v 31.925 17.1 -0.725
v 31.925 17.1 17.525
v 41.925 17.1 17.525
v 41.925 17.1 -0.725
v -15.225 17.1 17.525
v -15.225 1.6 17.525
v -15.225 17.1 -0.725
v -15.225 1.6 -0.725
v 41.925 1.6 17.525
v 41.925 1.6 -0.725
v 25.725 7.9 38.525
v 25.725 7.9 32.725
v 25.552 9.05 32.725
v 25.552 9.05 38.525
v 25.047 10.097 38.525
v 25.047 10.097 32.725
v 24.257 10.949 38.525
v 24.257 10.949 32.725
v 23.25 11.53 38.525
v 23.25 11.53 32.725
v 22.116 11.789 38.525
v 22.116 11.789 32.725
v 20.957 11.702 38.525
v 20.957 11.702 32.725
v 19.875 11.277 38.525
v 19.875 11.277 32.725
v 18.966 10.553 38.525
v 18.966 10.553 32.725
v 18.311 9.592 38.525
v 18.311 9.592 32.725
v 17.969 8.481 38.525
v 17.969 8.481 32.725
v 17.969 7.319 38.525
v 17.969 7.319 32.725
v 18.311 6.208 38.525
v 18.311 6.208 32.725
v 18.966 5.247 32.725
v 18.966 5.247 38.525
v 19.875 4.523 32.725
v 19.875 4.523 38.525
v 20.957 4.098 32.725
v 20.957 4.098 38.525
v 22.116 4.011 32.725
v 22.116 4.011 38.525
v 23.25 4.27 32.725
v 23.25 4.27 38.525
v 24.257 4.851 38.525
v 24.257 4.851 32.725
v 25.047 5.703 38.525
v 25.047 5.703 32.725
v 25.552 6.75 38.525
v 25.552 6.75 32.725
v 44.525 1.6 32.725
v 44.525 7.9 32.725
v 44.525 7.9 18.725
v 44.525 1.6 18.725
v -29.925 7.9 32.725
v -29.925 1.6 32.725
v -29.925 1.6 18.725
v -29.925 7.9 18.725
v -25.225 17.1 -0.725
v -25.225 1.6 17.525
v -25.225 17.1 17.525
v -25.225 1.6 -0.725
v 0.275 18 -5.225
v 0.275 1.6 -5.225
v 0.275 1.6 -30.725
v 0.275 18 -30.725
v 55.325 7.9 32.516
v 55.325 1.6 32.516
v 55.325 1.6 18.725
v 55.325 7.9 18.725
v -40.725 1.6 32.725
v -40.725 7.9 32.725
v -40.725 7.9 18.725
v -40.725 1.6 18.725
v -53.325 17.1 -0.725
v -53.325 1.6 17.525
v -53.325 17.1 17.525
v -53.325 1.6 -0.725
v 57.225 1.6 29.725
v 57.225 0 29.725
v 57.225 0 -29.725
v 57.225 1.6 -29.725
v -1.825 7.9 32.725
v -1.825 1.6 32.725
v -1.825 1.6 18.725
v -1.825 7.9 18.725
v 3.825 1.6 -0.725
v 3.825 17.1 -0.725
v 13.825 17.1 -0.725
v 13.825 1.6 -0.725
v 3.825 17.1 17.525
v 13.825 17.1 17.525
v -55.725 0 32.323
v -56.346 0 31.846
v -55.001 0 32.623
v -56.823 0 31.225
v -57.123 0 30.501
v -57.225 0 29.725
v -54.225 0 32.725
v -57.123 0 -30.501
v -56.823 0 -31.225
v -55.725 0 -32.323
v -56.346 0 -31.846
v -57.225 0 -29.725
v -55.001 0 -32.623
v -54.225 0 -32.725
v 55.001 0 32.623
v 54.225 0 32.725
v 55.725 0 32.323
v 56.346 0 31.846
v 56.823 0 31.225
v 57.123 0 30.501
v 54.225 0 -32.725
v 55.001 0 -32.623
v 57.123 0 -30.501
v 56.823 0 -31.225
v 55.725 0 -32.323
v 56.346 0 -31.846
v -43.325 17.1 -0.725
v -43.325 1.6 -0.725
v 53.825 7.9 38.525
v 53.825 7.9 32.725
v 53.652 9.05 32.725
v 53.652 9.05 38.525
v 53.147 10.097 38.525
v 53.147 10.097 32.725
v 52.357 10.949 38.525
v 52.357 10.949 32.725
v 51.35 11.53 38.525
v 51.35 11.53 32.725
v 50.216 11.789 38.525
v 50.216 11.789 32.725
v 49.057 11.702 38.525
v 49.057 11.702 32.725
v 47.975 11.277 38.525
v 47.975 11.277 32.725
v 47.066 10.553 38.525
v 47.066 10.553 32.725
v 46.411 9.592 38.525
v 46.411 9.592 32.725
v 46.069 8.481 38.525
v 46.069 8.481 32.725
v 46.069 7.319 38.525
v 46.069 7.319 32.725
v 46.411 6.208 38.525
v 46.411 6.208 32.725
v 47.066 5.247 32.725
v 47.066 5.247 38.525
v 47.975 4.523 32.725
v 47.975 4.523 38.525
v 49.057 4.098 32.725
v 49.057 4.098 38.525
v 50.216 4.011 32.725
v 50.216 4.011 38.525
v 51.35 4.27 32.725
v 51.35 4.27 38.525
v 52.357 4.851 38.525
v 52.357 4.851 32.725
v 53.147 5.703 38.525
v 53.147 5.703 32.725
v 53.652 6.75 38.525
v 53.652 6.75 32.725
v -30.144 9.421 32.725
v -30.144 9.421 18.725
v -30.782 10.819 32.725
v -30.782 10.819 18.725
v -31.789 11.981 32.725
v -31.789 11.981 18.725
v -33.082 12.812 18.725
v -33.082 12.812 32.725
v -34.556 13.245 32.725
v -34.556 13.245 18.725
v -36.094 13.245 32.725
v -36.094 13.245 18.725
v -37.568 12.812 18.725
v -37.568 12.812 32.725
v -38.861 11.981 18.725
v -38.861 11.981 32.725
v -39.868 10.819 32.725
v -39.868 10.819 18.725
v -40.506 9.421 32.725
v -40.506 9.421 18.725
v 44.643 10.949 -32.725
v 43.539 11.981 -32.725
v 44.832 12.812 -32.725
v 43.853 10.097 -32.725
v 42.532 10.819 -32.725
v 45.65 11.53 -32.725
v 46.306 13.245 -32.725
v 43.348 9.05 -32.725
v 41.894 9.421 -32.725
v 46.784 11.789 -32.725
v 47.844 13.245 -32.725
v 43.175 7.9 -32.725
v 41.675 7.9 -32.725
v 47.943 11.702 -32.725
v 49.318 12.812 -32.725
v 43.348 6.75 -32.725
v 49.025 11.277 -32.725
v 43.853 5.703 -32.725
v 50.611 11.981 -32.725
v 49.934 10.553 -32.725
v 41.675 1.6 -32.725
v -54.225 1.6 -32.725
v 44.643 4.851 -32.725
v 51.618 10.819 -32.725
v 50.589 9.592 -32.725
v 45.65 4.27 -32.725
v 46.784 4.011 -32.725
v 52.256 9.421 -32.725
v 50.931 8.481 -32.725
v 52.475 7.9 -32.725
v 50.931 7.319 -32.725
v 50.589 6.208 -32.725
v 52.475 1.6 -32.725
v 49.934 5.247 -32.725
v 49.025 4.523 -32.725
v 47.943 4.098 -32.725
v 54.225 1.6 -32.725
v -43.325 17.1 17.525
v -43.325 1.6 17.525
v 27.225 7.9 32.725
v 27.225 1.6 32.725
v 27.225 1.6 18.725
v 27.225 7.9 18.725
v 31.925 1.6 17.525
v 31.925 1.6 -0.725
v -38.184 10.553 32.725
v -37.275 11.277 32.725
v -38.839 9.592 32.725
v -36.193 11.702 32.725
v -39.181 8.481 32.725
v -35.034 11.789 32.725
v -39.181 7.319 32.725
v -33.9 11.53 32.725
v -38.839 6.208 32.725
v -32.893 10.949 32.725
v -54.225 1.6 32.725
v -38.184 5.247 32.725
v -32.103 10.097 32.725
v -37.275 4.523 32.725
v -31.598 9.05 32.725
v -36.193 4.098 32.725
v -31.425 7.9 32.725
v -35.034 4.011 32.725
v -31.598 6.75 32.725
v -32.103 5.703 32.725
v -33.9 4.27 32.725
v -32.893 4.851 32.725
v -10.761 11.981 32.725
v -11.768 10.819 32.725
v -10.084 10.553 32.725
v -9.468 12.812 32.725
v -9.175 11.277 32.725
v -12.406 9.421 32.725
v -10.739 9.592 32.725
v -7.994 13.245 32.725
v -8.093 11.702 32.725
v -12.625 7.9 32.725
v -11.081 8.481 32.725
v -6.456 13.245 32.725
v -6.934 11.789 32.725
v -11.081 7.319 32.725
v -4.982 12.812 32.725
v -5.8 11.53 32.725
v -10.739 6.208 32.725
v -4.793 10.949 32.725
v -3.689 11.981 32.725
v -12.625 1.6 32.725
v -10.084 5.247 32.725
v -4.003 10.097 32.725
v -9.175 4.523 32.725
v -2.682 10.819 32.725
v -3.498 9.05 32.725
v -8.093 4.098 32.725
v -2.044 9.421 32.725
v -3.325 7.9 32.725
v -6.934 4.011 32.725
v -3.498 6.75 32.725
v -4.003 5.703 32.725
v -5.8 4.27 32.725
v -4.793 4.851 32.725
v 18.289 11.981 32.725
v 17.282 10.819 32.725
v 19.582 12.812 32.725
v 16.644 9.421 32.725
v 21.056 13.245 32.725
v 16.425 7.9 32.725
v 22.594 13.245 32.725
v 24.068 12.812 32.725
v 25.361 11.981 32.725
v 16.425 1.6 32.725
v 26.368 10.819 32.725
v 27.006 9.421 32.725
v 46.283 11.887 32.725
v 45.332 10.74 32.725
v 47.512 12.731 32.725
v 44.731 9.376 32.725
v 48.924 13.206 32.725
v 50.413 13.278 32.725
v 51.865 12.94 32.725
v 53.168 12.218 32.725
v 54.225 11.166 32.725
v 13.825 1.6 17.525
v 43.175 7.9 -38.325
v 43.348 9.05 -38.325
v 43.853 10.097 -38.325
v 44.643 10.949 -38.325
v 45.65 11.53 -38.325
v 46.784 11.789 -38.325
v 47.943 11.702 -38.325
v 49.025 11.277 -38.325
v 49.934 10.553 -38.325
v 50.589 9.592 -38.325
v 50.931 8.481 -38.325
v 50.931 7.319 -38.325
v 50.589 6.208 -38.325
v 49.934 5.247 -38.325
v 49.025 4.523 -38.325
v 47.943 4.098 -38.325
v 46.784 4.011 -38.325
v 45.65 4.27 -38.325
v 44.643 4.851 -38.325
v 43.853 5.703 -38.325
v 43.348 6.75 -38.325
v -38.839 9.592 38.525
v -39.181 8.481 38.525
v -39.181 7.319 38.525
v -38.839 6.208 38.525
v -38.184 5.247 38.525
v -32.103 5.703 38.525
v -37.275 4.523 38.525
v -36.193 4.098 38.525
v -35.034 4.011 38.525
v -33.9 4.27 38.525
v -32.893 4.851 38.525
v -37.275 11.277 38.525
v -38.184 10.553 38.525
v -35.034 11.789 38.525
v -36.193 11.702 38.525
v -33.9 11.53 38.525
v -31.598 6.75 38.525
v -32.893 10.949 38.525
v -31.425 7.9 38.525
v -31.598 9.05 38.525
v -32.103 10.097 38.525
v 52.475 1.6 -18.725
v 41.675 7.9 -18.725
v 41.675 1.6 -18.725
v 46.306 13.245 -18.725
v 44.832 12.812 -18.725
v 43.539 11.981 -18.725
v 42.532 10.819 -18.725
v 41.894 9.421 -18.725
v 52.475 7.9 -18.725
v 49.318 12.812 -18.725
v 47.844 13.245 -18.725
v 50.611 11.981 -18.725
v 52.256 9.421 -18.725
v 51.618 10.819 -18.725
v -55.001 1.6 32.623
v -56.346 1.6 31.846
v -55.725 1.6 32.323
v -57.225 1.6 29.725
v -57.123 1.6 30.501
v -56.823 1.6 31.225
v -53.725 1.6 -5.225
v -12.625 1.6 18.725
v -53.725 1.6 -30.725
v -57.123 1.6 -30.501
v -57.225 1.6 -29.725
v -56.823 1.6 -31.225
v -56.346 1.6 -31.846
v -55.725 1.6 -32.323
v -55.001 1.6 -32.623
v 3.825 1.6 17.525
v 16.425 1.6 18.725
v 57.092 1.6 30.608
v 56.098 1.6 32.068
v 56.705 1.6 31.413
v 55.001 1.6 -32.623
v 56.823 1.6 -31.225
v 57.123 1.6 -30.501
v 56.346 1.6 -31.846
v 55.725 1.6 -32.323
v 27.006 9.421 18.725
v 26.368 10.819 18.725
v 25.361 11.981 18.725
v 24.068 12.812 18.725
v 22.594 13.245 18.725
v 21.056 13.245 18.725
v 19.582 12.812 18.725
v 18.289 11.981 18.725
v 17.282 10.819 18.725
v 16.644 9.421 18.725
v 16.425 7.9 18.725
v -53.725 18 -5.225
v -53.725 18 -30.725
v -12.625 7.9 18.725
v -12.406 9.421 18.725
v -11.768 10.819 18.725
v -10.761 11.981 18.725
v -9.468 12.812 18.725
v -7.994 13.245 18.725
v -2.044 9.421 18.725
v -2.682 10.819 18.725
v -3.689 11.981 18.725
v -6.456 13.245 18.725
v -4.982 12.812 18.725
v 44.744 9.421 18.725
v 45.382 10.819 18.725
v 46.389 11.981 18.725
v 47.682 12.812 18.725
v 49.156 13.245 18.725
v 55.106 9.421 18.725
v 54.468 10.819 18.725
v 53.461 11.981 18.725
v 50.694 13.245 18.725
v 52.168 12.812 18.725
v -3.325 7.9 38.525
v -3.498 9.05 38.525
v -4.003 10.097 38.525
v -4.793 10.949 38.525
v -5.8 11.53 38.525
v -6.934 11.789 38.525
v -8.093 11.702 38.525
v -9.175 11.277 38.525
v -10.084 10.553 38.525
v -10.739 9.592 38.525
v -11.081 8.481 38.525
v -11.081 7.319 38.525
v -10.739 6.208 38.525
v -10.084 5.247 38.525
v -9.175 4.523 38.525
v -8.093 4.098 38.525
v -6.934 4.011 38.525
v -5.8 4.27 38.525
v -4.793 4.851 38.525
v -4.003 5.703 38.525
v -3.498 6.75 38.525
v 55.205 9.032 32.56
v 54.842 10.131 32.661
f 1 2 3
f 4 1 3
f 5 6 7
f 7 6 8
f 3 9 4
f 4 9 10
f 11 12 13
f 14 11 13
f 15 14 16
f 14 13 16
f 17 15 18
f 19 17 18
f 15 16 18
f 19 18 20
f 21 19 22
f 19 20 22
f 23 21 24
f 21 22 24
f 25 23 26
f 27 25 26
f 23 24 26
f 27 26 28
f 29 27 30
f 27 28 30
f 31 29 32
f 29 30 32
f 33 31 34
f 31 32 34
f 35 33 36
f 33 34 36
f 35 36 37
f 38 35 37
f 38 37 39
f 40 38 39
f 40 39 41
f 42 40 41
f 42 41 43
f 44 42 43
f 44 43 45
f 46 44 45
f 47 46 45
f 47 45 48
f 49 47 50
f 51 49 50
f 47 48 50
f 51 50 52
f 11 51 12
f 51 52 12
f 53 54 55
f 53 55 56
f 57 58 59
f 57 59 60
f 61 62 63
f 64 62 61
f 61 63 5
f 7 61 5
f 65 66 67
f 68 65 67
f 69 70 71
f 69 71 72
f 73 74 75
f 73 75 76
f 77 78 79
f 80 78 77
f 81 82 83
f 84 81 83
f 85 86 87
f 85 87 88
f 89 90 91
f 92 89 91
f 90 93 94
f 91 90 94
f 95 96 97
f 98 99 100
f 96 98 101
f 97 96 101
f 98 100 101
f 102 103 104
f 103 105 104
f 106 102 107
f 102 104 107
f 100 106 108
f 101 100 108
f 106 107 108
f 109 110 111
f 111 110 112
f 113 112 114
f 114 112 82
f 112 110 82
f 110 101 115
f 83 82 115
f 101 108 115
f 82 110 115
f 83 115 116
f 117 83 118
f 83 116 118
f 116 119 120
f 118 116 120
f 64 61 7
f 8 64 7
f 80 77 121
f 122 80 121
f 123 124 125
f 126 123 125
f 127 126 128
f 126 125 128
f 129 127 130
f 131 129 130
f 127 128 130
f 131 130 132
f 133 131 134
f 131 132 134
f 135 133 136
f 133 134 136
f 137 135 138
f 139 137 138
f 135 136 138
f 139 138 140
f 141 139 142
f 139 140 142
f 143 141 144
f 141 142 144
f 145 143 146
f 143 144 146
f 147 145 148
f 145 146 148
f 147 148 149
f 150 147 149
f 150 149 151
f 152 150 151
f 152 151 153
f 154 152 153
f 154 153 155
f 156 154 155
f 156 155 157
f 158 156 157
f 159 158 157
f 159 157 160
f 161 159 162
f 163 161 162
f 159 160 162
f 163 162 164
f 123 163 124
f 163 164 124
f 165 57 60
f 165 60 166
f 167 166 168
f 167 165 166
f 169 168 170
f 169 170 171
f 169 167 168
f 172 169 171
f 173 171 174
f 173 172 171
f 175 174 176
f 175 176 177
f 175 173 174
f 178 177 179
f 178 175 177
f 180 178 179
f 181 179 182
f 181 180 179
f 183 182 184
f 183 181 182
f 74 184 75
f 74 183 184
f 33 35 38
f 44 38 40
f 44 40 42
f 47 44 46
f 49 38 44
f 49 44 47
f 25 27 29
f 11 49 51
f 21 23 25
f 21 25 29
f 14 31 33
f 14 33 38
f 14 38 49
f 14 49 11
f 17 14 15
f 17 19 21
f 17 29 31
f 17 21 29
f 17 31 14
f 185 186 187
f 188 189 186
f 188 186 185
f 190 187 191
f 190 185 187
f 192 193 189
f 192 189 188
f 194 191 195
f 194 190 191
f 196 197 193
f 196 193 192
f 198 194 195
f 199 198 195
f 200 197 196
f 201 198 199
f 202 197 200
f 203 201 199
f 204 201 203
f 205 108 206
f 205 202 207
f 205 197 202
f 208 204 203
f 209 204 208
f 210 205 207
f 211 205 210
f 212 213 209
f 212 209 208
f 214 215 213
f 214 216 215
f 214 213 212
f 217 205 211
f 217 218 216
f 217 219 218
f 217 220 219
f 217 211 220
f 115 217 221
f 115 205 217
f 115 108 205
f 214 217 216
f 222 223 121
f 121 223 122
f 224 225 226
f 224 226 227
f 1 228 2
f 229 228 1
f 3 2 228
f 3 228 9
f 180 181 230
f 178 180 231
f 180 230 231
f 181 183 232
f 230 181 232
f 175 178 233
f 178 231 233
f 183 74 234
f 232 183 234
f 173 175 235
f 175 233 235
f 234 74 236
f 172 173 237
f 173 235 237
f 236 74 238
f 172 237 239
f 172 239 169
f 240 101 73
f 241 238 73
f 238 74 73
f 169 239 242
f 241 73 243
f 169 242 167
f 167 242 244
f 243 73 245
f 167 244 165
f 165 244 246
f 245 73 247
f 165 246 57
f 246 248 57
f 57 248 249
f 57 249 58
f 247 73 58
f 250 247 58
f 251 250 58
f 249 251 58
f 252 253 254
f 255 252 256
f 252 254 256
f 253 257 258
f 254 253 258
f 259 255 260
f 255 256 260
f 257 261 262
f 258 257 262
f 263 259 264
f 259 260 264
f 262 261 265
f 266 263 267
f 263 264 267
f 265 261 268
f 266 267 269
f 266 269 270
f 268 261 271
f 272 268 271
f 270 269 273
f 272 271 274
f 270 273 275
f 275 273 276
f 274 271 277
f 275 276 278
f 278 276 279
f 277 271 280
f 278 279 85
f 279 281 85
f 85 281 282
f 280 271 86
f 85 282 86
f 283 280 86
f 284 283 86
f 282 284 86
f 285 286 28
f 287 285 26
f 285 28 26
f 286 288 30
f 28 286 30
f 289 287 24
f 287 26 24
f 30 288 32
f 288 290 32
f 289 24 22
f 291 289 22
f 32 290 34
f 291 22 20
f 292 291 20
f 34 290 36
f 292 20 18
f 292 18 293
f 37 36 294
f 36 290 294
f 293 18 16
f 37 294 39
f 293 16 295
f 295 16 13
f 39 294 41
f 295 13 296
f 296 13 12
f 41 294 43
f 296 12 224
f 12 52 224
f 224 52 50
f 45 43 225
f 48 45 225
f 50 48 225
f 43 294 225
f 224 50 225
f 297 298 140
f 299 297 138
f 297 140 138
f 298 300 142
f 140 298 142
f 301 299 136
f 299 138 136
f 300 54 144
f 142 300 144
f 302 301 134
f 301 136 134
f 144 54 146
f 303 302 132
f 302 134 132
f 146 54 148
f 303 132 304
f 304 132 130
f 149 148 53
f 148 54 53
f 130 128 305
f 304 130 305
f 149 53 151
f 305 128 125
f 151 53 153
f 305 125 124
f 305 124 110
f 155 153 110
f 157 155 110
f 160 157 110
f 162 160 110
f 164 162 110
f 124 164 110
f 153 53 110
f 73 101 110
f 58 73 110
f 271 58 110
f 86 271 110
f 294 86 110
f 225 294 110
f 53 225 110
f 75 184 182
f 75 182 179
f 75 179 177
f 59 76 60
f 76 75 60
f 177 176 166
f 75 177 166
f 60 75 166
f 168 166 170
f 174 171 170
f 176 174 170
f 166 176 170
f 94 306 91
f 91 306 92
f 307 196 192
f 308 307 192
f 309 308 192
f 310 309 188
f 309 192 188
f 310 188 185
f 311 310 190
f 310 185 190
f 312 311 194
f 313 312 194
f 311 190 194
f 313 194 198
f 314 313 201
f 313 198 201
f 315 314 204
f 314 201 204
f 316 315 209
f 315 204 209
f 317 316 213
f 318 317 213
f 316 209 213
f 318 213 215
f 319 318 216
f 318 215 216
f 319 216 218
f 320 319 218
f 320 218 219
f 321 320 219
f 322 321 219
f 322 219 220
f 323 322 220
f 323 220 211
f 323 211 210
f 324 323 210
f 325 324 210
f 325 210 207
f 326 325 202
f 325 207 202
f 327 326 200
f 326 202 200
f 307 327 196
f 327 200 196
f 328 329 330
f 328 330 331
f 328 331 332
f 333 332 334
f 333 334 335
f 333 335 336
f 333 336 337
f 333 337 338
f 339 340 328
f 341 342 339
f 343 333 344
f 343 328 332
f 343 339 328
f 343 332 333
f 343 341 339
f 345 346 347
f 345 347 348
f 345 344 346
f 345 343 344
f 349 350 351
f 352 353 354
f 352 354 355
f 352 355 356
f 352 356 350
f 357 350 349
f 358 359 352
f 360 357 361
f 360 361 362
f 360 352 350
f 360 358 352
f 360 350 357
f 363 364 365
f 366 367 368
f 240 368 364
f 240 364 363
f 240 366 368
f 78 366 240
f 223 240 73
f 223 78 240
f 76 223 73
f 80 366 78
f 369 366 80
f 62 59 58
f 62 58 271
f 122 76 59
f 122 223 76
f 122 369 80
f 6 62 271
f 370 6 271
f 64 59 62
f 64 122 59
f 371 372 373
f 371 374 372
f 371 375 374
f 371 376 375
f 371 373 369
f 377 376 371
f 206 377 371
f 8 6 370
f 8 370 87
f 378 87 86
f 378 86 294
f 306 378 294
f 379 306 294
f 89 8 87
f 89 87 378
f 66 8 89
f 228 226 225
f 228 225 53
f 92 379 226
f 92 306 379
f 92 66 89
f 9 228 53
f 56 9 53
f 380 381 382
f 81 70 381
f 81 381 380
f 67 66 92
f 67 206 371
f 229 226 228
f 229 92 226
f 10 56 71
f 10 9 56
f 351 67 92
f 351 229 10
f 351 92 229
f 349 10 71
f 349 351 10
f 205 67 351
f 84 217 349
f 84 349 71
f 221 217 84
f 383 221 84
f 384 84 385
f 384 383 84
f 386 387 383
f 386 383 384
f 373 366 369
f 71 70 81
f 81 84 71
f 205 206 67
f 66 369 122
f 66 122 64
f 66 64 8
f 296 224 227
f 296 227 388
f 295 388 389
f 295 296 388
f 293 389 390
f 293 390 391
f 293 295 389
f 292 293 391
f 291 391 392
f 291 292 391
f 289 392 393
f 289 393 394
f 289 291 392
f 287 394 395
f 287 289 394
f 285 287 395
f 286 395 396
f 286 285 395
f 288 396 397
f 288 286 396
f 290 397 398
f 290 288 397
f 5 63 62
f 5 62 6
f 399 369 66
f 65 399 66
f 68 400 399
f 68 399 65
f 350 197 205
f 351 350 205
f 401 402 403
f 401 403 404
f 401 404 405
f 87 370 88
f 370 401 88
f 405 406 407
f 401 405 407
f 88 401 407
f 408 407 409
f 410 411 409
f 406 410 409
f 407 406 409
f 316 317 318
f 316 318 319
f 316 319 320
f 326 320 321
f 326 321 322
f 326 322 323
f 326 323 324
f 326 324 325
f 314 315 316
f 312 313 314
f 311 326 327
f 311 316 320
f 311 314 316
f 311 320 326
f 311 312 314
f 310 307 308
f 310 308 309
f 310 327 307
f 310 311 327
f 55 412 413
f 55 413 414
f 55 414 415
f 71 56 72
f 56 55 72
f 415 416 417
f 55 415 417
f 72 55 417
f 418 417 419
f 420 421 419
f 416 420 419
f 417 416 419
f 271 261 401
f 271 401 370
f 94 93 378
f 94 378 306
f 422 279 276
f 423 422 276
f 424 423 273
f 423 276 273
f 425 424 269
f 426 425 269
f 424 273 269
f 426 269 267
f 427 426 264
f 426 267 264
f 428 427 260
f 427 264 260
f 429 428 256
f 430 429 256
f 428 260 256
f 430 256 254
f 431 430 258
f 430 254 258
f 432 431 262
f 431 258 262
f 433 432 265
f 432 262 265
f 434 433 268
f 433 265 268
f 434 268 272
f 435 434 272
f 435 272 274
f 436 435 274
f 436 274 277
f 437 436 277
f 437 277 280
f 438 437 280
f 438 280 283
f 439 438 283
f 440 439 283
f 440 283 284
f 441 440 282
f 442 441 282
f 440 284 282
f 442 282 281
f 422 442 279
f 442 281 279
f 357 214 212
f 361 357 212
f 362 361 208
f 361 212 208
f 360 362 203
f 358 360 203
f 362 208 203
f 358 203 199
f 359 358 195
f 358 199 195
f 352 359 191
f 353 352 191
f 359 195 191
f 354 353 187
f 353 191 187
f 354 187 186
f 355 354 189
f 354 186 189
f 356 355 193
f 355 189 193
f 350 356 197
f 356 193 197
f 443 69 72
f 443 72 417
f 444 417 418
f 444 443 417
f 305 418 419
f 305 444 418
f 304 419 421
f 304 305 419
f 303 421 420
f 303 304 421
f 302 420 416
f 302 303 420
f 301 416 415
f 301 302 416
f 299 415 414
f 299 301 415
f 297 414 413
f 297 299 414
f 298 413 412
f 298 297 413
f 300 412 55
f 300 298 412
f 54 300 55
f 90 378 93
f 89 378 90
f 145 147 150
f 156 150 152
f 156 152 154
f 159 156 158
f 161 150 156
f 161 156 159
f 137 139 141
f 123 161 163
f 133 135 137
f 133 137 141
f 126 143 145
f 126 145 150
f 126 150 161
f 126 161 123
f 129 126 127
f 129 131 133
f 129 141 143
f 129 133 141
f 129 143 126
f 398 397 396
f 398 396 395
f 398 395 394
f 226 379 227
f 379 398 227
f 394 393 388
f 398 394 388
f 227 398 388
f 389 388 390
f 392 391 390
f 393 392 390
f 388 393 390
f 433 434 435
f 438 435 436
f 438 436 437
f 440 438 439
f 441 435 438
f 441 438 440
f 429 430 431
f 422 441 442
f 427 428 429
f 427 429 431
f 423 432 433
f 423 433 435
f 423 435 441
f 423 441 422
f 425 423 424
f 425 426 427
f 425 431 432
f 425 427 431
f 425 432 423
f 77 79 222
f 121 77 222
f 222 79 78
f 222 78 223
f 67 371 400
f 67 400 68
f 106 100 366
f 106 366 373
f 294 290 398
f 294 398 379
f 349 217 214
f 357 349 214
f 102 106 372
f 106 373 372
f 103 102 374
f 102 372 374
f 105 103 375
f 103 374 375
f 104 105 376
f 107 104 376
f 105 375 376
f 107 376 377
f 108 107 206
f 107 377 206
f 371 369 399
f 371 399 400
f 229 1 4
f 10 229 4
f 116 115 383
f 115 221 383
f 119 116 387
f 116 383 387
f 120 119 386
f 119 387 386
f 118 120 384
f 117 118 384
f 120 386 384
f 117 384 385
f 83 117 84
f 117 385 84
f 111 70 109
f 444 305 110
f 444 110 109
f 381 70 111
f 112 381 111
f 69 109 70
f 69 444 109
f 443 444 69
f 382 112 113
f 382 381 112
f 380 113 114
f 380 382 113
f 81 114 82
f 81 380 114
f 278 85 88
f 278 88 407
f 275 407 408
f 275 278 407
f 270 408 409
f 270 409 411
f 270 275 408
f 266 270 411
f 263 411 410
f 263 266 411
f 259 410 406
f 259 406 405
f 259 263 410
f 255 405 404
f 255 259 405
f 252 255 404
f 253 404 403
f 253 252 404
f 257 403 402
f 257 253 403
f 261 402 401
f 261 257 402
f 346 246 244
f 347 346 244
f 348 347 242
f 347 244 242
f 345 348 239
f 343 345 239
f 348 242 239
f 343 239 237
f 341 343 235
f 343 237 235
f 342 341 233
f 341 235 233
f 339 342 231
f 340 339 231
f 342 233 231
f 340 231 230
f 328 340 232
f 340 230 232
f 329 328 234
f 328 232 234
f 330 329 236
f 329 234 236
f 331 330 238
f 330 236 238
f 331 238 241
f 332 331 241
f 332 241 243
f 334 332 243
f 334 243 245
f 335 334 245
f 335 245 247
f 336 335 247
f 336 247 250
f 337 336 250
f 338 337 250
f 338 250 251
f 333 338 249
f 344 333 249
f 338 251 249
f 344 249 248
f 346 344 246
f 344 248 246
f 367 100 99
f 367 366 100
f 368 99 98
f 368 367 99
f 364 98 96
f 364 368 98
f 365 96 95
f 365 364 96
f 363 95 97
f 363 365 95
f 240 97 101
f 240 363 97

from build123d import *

# Parameters (mm, degrees)
ESQUISSE1_W                          = 114.45
ESQUISSE1_H                          = 65.45
BOSS_EXTRU_1_DEPTH                   = 1.6
BOSS_EXTRU_2_DEPTH                   = 14
ESQUISSE3_R                          = 3.9
BOSS_EXTRU_3_DEPTH                   = 5.8
ESQUISSE6_W                          = 10
ESQUISSE6_H                          = 18.25
BOSS_EXTRU_6_DEPTH                   = 15.5
R_P_TITION_LIN_AIRE1_COUNT           = 2
R_P_TITION_LIN_AIRE1_PITCH           = 28.1
R_P_TITION_LIN_AIRE2_COUNT           = 2
R_P_TITION_LIN_AIRE2_PITCH           = 57.15
R_P_TITION_LIN_AIRE2_COPY_1_DEPTH    = 14
R_P_TITION_LIN_AIRE2_COPY_2_SKETCH_R = 3.9
R_P_TITION_LIN_AIRE2_COPY_2_DEPTH    = 5.8
R_P_TITION_LIN_AIRE2_COPY_3_SKETCH_W = 10
R_P_TITION_LIN_AIRE2_COPY_3_SKETCH_H = 18.25
R_P_TITION_LIN_AIRE2_COPY_3_DEPTH    = 15.5
BOSS_EXTRU_4_DEPTH                   = 14
ESQUISSE5_R                          = 3.9
BOSS_EXTRU_5_DEPTH                   = 5.6
CONG_1_R                             = 3
ESQUISSE7_W                          = 54
ESQUISSE7_H                          = 25.5
BOSS_EXTRU_7_DEPTH                   = 16.4


with BuildPart() as part:
    # Esquisse1 → Boss.-Extru.1 (new body)
    with BuildSketch(Plane(origin=(0, 0, 0), x_dir=(1, 0, 0), z_dir=(0, 1, 0))):
        Rectangle(ESQUISSE1_W, ESQUISSE1_H)
    extrude(amount=BOSS_EXTRU_1_DEPTH)

    # Esquisse2 → Boss.-Extru.2 (add)
    with BuildSketch(Plane.XY.offset(32.725)):
        with BuildLine():
            Line((44.525, 1.6), (55.325, 1.6))
            Line((55.325, 1.6), (55.325, 7.9))
            ThreePointArc((55.325, 7.9), (49.925, 13.3), (44.525, 7.9))
            Line((44.525, 7.9), (44.525, 1.6))
        make_face()
    boss_extru_2 = extrude(amount=-BOSS_EXTRU_2_DEPTH)

    # Esquisse3 → Boss.-Extru.3 (add)
    with BuildSketch(Plane.XY.offset(32.725)):
        with Locations((49.925, 7.9)):
            Circle(ESQUISSE3_R)
    boss_extru_3 = extrude(amount=BOSS_EXTRU_3_DEPTH)

    # Esquisse6 → Boss.-Extru.6 (add)
    with BuildSketch(Plane(origin=(0, 1.6, 0), x_dir=(1, 0, 0), z_dir=(0, 1, 0))):
        with Locations((36.925, -8.4)):
            Rectangle(ESQUISSE6_W, ESQUISSE6_H)
    boss_extru_6 = extrude(amount=BOSS_EXTRU_6_DEPTH)

    # Répétition linéaire1: Boss.-Extru.2, Boss.-Extru.3, Boss.-Extru.6 ×2
    with Locations(*[(-i * R_P_TITION_LIN_AIRE1_PITCH, 0, 0) for i in range(1, R_P_TITION_LIN_AIRE1_COUNT)]):
        add(boss_extru_2)
        add(boss_extru_3)
        add(boss_extru_6)

    # Répétition linéaire2: Boss.-Extru.2, Boss.-Extru.3, Boss.-Extru.6 ×2
    with Locations(*[(-i * R_P_TITION_LIN_AIRE2_PITCH, 0, 0) for i in range(1, R_P_TITION_LIN_AIRE2_COUNT)]):
        add(boss_extru_2)
        add(boss_extru_3)
        add(boss_extru_6)

    # Répétition linéaire2 copy 1 sketch → Répétition linéaire2 copy 1 (add)
    with BuildSketch(Plane(origin=(-85.25, 0, 32.725), x_dir=(1, 0, 0), z_dir=(0, 0, 1))):
        with BuildLine():
            Line((44.525, 1.6), (55.325, 1.6))
            Line((55.325, 1.6), (55.325, 7.9))
            ThreePointArc((55.325, 7.9), (49.925, 13.3), (44.525, 7.9))
            Line((44.525, 7.9), (44.525, 1.6))
        make_face()
    extrude(amount=-R_P_TITION_LIN_AIRE2_COPY_1_DEPTH)

    # Répétition linéaire2 copy 2 sketch → Répétition linéaire2 copy 2 (add)
    with BuildSketch(Plane(origin=(-85.25, 0, 32.725), x_dir=(1, 0, 0), z_dir=(0, 0, 1))):
        with Locations((49.925, 7.9)):
            Circle(R_P_TITION_LIN_AIRE2_COPY_2_SKETCH_R)
    extrude(amount=R_P_TITION_LIN_AIRE2_COPY_2_DEPTH)

    # Répétition linéaire2 copy 3 sketch → Répétition linéaire2 copy 3 (add)
    with BuildSketch(Plane(origin=(-85.25, 1.6, 0), x_dir=(1, 0, 0), z_dir=(0, 1, 0))):
        with Locations((36.925, -8.4)):
            Rectangle(R_P_TITION_LIN_AIRE2_COPY_3_SKETCH_W, R_P_TITION_LIN_AIRE2_COPY_3_SKETCH_H)
    extrude(amount=R_P_TITION_LIN_AIRE2_COPY_3_DEPTH)

    # Esquisse4 → Boss.-Extru.4 (add)
    with BuildSketch(Plane(origin=(0, 0, -32.725), x_dir=(-1, 0, 0), z_dir=(0, 0, -1))):
        with BuildLine():
            Line((-41.675, 1.6), (-52.475, 1.6))
            Line((-52.475, 1.6), (-52.475, 7.9))
            ThreePointArc((-52.475, 7.9), (-47.075, 13.3), (-41.675, 7.9))
            Line((-41.675, 7.9), (-41.675, 1.6))
        make_face()
    extrude(amount=-BOSS_EXTRU_4_DEPTH)

    # Esquisse5 → Boss.-Extru.5 (add)
    with BuildSketch(Plane(origin=(0, 0, -32.725), x_dir=(-1, 0, 0), z_dir=(0, 0, -1))):
        with Locations((-47.075, 7.9)):
            Circle(ESQUISSE5_R)
    extrude(amount=BOSS_EXTRU_5_DEPTH)

    # Congé1
    cong_1_edges = [part.edges().sort_by_distance(p)[0] for p in [
        (57.225, 0.8, -32.725),
        (-57.225, 0.8, -32.725),
        (-57.225, 0.8, 32.725),
        (57.225, 0.8, 32.725),
    ]]
    fillet(cong_1_edges, radius=CONG_1_R)

    # Esquisse7 → Boss.-Extru.7 (add)
    with BuildSketch(Plane(origin=(0, 1.6, 0), x_dir=(1, 0, 0), z_dir=(0, 1, 0))):
        with Locations((-26.725, 17.975)):
            Rectangle(ESQUISSE7_W, ESQUISSE7_H)
    extrude(amount=BOSS_EXTRU_7_DEPTH)


solid = part.part
